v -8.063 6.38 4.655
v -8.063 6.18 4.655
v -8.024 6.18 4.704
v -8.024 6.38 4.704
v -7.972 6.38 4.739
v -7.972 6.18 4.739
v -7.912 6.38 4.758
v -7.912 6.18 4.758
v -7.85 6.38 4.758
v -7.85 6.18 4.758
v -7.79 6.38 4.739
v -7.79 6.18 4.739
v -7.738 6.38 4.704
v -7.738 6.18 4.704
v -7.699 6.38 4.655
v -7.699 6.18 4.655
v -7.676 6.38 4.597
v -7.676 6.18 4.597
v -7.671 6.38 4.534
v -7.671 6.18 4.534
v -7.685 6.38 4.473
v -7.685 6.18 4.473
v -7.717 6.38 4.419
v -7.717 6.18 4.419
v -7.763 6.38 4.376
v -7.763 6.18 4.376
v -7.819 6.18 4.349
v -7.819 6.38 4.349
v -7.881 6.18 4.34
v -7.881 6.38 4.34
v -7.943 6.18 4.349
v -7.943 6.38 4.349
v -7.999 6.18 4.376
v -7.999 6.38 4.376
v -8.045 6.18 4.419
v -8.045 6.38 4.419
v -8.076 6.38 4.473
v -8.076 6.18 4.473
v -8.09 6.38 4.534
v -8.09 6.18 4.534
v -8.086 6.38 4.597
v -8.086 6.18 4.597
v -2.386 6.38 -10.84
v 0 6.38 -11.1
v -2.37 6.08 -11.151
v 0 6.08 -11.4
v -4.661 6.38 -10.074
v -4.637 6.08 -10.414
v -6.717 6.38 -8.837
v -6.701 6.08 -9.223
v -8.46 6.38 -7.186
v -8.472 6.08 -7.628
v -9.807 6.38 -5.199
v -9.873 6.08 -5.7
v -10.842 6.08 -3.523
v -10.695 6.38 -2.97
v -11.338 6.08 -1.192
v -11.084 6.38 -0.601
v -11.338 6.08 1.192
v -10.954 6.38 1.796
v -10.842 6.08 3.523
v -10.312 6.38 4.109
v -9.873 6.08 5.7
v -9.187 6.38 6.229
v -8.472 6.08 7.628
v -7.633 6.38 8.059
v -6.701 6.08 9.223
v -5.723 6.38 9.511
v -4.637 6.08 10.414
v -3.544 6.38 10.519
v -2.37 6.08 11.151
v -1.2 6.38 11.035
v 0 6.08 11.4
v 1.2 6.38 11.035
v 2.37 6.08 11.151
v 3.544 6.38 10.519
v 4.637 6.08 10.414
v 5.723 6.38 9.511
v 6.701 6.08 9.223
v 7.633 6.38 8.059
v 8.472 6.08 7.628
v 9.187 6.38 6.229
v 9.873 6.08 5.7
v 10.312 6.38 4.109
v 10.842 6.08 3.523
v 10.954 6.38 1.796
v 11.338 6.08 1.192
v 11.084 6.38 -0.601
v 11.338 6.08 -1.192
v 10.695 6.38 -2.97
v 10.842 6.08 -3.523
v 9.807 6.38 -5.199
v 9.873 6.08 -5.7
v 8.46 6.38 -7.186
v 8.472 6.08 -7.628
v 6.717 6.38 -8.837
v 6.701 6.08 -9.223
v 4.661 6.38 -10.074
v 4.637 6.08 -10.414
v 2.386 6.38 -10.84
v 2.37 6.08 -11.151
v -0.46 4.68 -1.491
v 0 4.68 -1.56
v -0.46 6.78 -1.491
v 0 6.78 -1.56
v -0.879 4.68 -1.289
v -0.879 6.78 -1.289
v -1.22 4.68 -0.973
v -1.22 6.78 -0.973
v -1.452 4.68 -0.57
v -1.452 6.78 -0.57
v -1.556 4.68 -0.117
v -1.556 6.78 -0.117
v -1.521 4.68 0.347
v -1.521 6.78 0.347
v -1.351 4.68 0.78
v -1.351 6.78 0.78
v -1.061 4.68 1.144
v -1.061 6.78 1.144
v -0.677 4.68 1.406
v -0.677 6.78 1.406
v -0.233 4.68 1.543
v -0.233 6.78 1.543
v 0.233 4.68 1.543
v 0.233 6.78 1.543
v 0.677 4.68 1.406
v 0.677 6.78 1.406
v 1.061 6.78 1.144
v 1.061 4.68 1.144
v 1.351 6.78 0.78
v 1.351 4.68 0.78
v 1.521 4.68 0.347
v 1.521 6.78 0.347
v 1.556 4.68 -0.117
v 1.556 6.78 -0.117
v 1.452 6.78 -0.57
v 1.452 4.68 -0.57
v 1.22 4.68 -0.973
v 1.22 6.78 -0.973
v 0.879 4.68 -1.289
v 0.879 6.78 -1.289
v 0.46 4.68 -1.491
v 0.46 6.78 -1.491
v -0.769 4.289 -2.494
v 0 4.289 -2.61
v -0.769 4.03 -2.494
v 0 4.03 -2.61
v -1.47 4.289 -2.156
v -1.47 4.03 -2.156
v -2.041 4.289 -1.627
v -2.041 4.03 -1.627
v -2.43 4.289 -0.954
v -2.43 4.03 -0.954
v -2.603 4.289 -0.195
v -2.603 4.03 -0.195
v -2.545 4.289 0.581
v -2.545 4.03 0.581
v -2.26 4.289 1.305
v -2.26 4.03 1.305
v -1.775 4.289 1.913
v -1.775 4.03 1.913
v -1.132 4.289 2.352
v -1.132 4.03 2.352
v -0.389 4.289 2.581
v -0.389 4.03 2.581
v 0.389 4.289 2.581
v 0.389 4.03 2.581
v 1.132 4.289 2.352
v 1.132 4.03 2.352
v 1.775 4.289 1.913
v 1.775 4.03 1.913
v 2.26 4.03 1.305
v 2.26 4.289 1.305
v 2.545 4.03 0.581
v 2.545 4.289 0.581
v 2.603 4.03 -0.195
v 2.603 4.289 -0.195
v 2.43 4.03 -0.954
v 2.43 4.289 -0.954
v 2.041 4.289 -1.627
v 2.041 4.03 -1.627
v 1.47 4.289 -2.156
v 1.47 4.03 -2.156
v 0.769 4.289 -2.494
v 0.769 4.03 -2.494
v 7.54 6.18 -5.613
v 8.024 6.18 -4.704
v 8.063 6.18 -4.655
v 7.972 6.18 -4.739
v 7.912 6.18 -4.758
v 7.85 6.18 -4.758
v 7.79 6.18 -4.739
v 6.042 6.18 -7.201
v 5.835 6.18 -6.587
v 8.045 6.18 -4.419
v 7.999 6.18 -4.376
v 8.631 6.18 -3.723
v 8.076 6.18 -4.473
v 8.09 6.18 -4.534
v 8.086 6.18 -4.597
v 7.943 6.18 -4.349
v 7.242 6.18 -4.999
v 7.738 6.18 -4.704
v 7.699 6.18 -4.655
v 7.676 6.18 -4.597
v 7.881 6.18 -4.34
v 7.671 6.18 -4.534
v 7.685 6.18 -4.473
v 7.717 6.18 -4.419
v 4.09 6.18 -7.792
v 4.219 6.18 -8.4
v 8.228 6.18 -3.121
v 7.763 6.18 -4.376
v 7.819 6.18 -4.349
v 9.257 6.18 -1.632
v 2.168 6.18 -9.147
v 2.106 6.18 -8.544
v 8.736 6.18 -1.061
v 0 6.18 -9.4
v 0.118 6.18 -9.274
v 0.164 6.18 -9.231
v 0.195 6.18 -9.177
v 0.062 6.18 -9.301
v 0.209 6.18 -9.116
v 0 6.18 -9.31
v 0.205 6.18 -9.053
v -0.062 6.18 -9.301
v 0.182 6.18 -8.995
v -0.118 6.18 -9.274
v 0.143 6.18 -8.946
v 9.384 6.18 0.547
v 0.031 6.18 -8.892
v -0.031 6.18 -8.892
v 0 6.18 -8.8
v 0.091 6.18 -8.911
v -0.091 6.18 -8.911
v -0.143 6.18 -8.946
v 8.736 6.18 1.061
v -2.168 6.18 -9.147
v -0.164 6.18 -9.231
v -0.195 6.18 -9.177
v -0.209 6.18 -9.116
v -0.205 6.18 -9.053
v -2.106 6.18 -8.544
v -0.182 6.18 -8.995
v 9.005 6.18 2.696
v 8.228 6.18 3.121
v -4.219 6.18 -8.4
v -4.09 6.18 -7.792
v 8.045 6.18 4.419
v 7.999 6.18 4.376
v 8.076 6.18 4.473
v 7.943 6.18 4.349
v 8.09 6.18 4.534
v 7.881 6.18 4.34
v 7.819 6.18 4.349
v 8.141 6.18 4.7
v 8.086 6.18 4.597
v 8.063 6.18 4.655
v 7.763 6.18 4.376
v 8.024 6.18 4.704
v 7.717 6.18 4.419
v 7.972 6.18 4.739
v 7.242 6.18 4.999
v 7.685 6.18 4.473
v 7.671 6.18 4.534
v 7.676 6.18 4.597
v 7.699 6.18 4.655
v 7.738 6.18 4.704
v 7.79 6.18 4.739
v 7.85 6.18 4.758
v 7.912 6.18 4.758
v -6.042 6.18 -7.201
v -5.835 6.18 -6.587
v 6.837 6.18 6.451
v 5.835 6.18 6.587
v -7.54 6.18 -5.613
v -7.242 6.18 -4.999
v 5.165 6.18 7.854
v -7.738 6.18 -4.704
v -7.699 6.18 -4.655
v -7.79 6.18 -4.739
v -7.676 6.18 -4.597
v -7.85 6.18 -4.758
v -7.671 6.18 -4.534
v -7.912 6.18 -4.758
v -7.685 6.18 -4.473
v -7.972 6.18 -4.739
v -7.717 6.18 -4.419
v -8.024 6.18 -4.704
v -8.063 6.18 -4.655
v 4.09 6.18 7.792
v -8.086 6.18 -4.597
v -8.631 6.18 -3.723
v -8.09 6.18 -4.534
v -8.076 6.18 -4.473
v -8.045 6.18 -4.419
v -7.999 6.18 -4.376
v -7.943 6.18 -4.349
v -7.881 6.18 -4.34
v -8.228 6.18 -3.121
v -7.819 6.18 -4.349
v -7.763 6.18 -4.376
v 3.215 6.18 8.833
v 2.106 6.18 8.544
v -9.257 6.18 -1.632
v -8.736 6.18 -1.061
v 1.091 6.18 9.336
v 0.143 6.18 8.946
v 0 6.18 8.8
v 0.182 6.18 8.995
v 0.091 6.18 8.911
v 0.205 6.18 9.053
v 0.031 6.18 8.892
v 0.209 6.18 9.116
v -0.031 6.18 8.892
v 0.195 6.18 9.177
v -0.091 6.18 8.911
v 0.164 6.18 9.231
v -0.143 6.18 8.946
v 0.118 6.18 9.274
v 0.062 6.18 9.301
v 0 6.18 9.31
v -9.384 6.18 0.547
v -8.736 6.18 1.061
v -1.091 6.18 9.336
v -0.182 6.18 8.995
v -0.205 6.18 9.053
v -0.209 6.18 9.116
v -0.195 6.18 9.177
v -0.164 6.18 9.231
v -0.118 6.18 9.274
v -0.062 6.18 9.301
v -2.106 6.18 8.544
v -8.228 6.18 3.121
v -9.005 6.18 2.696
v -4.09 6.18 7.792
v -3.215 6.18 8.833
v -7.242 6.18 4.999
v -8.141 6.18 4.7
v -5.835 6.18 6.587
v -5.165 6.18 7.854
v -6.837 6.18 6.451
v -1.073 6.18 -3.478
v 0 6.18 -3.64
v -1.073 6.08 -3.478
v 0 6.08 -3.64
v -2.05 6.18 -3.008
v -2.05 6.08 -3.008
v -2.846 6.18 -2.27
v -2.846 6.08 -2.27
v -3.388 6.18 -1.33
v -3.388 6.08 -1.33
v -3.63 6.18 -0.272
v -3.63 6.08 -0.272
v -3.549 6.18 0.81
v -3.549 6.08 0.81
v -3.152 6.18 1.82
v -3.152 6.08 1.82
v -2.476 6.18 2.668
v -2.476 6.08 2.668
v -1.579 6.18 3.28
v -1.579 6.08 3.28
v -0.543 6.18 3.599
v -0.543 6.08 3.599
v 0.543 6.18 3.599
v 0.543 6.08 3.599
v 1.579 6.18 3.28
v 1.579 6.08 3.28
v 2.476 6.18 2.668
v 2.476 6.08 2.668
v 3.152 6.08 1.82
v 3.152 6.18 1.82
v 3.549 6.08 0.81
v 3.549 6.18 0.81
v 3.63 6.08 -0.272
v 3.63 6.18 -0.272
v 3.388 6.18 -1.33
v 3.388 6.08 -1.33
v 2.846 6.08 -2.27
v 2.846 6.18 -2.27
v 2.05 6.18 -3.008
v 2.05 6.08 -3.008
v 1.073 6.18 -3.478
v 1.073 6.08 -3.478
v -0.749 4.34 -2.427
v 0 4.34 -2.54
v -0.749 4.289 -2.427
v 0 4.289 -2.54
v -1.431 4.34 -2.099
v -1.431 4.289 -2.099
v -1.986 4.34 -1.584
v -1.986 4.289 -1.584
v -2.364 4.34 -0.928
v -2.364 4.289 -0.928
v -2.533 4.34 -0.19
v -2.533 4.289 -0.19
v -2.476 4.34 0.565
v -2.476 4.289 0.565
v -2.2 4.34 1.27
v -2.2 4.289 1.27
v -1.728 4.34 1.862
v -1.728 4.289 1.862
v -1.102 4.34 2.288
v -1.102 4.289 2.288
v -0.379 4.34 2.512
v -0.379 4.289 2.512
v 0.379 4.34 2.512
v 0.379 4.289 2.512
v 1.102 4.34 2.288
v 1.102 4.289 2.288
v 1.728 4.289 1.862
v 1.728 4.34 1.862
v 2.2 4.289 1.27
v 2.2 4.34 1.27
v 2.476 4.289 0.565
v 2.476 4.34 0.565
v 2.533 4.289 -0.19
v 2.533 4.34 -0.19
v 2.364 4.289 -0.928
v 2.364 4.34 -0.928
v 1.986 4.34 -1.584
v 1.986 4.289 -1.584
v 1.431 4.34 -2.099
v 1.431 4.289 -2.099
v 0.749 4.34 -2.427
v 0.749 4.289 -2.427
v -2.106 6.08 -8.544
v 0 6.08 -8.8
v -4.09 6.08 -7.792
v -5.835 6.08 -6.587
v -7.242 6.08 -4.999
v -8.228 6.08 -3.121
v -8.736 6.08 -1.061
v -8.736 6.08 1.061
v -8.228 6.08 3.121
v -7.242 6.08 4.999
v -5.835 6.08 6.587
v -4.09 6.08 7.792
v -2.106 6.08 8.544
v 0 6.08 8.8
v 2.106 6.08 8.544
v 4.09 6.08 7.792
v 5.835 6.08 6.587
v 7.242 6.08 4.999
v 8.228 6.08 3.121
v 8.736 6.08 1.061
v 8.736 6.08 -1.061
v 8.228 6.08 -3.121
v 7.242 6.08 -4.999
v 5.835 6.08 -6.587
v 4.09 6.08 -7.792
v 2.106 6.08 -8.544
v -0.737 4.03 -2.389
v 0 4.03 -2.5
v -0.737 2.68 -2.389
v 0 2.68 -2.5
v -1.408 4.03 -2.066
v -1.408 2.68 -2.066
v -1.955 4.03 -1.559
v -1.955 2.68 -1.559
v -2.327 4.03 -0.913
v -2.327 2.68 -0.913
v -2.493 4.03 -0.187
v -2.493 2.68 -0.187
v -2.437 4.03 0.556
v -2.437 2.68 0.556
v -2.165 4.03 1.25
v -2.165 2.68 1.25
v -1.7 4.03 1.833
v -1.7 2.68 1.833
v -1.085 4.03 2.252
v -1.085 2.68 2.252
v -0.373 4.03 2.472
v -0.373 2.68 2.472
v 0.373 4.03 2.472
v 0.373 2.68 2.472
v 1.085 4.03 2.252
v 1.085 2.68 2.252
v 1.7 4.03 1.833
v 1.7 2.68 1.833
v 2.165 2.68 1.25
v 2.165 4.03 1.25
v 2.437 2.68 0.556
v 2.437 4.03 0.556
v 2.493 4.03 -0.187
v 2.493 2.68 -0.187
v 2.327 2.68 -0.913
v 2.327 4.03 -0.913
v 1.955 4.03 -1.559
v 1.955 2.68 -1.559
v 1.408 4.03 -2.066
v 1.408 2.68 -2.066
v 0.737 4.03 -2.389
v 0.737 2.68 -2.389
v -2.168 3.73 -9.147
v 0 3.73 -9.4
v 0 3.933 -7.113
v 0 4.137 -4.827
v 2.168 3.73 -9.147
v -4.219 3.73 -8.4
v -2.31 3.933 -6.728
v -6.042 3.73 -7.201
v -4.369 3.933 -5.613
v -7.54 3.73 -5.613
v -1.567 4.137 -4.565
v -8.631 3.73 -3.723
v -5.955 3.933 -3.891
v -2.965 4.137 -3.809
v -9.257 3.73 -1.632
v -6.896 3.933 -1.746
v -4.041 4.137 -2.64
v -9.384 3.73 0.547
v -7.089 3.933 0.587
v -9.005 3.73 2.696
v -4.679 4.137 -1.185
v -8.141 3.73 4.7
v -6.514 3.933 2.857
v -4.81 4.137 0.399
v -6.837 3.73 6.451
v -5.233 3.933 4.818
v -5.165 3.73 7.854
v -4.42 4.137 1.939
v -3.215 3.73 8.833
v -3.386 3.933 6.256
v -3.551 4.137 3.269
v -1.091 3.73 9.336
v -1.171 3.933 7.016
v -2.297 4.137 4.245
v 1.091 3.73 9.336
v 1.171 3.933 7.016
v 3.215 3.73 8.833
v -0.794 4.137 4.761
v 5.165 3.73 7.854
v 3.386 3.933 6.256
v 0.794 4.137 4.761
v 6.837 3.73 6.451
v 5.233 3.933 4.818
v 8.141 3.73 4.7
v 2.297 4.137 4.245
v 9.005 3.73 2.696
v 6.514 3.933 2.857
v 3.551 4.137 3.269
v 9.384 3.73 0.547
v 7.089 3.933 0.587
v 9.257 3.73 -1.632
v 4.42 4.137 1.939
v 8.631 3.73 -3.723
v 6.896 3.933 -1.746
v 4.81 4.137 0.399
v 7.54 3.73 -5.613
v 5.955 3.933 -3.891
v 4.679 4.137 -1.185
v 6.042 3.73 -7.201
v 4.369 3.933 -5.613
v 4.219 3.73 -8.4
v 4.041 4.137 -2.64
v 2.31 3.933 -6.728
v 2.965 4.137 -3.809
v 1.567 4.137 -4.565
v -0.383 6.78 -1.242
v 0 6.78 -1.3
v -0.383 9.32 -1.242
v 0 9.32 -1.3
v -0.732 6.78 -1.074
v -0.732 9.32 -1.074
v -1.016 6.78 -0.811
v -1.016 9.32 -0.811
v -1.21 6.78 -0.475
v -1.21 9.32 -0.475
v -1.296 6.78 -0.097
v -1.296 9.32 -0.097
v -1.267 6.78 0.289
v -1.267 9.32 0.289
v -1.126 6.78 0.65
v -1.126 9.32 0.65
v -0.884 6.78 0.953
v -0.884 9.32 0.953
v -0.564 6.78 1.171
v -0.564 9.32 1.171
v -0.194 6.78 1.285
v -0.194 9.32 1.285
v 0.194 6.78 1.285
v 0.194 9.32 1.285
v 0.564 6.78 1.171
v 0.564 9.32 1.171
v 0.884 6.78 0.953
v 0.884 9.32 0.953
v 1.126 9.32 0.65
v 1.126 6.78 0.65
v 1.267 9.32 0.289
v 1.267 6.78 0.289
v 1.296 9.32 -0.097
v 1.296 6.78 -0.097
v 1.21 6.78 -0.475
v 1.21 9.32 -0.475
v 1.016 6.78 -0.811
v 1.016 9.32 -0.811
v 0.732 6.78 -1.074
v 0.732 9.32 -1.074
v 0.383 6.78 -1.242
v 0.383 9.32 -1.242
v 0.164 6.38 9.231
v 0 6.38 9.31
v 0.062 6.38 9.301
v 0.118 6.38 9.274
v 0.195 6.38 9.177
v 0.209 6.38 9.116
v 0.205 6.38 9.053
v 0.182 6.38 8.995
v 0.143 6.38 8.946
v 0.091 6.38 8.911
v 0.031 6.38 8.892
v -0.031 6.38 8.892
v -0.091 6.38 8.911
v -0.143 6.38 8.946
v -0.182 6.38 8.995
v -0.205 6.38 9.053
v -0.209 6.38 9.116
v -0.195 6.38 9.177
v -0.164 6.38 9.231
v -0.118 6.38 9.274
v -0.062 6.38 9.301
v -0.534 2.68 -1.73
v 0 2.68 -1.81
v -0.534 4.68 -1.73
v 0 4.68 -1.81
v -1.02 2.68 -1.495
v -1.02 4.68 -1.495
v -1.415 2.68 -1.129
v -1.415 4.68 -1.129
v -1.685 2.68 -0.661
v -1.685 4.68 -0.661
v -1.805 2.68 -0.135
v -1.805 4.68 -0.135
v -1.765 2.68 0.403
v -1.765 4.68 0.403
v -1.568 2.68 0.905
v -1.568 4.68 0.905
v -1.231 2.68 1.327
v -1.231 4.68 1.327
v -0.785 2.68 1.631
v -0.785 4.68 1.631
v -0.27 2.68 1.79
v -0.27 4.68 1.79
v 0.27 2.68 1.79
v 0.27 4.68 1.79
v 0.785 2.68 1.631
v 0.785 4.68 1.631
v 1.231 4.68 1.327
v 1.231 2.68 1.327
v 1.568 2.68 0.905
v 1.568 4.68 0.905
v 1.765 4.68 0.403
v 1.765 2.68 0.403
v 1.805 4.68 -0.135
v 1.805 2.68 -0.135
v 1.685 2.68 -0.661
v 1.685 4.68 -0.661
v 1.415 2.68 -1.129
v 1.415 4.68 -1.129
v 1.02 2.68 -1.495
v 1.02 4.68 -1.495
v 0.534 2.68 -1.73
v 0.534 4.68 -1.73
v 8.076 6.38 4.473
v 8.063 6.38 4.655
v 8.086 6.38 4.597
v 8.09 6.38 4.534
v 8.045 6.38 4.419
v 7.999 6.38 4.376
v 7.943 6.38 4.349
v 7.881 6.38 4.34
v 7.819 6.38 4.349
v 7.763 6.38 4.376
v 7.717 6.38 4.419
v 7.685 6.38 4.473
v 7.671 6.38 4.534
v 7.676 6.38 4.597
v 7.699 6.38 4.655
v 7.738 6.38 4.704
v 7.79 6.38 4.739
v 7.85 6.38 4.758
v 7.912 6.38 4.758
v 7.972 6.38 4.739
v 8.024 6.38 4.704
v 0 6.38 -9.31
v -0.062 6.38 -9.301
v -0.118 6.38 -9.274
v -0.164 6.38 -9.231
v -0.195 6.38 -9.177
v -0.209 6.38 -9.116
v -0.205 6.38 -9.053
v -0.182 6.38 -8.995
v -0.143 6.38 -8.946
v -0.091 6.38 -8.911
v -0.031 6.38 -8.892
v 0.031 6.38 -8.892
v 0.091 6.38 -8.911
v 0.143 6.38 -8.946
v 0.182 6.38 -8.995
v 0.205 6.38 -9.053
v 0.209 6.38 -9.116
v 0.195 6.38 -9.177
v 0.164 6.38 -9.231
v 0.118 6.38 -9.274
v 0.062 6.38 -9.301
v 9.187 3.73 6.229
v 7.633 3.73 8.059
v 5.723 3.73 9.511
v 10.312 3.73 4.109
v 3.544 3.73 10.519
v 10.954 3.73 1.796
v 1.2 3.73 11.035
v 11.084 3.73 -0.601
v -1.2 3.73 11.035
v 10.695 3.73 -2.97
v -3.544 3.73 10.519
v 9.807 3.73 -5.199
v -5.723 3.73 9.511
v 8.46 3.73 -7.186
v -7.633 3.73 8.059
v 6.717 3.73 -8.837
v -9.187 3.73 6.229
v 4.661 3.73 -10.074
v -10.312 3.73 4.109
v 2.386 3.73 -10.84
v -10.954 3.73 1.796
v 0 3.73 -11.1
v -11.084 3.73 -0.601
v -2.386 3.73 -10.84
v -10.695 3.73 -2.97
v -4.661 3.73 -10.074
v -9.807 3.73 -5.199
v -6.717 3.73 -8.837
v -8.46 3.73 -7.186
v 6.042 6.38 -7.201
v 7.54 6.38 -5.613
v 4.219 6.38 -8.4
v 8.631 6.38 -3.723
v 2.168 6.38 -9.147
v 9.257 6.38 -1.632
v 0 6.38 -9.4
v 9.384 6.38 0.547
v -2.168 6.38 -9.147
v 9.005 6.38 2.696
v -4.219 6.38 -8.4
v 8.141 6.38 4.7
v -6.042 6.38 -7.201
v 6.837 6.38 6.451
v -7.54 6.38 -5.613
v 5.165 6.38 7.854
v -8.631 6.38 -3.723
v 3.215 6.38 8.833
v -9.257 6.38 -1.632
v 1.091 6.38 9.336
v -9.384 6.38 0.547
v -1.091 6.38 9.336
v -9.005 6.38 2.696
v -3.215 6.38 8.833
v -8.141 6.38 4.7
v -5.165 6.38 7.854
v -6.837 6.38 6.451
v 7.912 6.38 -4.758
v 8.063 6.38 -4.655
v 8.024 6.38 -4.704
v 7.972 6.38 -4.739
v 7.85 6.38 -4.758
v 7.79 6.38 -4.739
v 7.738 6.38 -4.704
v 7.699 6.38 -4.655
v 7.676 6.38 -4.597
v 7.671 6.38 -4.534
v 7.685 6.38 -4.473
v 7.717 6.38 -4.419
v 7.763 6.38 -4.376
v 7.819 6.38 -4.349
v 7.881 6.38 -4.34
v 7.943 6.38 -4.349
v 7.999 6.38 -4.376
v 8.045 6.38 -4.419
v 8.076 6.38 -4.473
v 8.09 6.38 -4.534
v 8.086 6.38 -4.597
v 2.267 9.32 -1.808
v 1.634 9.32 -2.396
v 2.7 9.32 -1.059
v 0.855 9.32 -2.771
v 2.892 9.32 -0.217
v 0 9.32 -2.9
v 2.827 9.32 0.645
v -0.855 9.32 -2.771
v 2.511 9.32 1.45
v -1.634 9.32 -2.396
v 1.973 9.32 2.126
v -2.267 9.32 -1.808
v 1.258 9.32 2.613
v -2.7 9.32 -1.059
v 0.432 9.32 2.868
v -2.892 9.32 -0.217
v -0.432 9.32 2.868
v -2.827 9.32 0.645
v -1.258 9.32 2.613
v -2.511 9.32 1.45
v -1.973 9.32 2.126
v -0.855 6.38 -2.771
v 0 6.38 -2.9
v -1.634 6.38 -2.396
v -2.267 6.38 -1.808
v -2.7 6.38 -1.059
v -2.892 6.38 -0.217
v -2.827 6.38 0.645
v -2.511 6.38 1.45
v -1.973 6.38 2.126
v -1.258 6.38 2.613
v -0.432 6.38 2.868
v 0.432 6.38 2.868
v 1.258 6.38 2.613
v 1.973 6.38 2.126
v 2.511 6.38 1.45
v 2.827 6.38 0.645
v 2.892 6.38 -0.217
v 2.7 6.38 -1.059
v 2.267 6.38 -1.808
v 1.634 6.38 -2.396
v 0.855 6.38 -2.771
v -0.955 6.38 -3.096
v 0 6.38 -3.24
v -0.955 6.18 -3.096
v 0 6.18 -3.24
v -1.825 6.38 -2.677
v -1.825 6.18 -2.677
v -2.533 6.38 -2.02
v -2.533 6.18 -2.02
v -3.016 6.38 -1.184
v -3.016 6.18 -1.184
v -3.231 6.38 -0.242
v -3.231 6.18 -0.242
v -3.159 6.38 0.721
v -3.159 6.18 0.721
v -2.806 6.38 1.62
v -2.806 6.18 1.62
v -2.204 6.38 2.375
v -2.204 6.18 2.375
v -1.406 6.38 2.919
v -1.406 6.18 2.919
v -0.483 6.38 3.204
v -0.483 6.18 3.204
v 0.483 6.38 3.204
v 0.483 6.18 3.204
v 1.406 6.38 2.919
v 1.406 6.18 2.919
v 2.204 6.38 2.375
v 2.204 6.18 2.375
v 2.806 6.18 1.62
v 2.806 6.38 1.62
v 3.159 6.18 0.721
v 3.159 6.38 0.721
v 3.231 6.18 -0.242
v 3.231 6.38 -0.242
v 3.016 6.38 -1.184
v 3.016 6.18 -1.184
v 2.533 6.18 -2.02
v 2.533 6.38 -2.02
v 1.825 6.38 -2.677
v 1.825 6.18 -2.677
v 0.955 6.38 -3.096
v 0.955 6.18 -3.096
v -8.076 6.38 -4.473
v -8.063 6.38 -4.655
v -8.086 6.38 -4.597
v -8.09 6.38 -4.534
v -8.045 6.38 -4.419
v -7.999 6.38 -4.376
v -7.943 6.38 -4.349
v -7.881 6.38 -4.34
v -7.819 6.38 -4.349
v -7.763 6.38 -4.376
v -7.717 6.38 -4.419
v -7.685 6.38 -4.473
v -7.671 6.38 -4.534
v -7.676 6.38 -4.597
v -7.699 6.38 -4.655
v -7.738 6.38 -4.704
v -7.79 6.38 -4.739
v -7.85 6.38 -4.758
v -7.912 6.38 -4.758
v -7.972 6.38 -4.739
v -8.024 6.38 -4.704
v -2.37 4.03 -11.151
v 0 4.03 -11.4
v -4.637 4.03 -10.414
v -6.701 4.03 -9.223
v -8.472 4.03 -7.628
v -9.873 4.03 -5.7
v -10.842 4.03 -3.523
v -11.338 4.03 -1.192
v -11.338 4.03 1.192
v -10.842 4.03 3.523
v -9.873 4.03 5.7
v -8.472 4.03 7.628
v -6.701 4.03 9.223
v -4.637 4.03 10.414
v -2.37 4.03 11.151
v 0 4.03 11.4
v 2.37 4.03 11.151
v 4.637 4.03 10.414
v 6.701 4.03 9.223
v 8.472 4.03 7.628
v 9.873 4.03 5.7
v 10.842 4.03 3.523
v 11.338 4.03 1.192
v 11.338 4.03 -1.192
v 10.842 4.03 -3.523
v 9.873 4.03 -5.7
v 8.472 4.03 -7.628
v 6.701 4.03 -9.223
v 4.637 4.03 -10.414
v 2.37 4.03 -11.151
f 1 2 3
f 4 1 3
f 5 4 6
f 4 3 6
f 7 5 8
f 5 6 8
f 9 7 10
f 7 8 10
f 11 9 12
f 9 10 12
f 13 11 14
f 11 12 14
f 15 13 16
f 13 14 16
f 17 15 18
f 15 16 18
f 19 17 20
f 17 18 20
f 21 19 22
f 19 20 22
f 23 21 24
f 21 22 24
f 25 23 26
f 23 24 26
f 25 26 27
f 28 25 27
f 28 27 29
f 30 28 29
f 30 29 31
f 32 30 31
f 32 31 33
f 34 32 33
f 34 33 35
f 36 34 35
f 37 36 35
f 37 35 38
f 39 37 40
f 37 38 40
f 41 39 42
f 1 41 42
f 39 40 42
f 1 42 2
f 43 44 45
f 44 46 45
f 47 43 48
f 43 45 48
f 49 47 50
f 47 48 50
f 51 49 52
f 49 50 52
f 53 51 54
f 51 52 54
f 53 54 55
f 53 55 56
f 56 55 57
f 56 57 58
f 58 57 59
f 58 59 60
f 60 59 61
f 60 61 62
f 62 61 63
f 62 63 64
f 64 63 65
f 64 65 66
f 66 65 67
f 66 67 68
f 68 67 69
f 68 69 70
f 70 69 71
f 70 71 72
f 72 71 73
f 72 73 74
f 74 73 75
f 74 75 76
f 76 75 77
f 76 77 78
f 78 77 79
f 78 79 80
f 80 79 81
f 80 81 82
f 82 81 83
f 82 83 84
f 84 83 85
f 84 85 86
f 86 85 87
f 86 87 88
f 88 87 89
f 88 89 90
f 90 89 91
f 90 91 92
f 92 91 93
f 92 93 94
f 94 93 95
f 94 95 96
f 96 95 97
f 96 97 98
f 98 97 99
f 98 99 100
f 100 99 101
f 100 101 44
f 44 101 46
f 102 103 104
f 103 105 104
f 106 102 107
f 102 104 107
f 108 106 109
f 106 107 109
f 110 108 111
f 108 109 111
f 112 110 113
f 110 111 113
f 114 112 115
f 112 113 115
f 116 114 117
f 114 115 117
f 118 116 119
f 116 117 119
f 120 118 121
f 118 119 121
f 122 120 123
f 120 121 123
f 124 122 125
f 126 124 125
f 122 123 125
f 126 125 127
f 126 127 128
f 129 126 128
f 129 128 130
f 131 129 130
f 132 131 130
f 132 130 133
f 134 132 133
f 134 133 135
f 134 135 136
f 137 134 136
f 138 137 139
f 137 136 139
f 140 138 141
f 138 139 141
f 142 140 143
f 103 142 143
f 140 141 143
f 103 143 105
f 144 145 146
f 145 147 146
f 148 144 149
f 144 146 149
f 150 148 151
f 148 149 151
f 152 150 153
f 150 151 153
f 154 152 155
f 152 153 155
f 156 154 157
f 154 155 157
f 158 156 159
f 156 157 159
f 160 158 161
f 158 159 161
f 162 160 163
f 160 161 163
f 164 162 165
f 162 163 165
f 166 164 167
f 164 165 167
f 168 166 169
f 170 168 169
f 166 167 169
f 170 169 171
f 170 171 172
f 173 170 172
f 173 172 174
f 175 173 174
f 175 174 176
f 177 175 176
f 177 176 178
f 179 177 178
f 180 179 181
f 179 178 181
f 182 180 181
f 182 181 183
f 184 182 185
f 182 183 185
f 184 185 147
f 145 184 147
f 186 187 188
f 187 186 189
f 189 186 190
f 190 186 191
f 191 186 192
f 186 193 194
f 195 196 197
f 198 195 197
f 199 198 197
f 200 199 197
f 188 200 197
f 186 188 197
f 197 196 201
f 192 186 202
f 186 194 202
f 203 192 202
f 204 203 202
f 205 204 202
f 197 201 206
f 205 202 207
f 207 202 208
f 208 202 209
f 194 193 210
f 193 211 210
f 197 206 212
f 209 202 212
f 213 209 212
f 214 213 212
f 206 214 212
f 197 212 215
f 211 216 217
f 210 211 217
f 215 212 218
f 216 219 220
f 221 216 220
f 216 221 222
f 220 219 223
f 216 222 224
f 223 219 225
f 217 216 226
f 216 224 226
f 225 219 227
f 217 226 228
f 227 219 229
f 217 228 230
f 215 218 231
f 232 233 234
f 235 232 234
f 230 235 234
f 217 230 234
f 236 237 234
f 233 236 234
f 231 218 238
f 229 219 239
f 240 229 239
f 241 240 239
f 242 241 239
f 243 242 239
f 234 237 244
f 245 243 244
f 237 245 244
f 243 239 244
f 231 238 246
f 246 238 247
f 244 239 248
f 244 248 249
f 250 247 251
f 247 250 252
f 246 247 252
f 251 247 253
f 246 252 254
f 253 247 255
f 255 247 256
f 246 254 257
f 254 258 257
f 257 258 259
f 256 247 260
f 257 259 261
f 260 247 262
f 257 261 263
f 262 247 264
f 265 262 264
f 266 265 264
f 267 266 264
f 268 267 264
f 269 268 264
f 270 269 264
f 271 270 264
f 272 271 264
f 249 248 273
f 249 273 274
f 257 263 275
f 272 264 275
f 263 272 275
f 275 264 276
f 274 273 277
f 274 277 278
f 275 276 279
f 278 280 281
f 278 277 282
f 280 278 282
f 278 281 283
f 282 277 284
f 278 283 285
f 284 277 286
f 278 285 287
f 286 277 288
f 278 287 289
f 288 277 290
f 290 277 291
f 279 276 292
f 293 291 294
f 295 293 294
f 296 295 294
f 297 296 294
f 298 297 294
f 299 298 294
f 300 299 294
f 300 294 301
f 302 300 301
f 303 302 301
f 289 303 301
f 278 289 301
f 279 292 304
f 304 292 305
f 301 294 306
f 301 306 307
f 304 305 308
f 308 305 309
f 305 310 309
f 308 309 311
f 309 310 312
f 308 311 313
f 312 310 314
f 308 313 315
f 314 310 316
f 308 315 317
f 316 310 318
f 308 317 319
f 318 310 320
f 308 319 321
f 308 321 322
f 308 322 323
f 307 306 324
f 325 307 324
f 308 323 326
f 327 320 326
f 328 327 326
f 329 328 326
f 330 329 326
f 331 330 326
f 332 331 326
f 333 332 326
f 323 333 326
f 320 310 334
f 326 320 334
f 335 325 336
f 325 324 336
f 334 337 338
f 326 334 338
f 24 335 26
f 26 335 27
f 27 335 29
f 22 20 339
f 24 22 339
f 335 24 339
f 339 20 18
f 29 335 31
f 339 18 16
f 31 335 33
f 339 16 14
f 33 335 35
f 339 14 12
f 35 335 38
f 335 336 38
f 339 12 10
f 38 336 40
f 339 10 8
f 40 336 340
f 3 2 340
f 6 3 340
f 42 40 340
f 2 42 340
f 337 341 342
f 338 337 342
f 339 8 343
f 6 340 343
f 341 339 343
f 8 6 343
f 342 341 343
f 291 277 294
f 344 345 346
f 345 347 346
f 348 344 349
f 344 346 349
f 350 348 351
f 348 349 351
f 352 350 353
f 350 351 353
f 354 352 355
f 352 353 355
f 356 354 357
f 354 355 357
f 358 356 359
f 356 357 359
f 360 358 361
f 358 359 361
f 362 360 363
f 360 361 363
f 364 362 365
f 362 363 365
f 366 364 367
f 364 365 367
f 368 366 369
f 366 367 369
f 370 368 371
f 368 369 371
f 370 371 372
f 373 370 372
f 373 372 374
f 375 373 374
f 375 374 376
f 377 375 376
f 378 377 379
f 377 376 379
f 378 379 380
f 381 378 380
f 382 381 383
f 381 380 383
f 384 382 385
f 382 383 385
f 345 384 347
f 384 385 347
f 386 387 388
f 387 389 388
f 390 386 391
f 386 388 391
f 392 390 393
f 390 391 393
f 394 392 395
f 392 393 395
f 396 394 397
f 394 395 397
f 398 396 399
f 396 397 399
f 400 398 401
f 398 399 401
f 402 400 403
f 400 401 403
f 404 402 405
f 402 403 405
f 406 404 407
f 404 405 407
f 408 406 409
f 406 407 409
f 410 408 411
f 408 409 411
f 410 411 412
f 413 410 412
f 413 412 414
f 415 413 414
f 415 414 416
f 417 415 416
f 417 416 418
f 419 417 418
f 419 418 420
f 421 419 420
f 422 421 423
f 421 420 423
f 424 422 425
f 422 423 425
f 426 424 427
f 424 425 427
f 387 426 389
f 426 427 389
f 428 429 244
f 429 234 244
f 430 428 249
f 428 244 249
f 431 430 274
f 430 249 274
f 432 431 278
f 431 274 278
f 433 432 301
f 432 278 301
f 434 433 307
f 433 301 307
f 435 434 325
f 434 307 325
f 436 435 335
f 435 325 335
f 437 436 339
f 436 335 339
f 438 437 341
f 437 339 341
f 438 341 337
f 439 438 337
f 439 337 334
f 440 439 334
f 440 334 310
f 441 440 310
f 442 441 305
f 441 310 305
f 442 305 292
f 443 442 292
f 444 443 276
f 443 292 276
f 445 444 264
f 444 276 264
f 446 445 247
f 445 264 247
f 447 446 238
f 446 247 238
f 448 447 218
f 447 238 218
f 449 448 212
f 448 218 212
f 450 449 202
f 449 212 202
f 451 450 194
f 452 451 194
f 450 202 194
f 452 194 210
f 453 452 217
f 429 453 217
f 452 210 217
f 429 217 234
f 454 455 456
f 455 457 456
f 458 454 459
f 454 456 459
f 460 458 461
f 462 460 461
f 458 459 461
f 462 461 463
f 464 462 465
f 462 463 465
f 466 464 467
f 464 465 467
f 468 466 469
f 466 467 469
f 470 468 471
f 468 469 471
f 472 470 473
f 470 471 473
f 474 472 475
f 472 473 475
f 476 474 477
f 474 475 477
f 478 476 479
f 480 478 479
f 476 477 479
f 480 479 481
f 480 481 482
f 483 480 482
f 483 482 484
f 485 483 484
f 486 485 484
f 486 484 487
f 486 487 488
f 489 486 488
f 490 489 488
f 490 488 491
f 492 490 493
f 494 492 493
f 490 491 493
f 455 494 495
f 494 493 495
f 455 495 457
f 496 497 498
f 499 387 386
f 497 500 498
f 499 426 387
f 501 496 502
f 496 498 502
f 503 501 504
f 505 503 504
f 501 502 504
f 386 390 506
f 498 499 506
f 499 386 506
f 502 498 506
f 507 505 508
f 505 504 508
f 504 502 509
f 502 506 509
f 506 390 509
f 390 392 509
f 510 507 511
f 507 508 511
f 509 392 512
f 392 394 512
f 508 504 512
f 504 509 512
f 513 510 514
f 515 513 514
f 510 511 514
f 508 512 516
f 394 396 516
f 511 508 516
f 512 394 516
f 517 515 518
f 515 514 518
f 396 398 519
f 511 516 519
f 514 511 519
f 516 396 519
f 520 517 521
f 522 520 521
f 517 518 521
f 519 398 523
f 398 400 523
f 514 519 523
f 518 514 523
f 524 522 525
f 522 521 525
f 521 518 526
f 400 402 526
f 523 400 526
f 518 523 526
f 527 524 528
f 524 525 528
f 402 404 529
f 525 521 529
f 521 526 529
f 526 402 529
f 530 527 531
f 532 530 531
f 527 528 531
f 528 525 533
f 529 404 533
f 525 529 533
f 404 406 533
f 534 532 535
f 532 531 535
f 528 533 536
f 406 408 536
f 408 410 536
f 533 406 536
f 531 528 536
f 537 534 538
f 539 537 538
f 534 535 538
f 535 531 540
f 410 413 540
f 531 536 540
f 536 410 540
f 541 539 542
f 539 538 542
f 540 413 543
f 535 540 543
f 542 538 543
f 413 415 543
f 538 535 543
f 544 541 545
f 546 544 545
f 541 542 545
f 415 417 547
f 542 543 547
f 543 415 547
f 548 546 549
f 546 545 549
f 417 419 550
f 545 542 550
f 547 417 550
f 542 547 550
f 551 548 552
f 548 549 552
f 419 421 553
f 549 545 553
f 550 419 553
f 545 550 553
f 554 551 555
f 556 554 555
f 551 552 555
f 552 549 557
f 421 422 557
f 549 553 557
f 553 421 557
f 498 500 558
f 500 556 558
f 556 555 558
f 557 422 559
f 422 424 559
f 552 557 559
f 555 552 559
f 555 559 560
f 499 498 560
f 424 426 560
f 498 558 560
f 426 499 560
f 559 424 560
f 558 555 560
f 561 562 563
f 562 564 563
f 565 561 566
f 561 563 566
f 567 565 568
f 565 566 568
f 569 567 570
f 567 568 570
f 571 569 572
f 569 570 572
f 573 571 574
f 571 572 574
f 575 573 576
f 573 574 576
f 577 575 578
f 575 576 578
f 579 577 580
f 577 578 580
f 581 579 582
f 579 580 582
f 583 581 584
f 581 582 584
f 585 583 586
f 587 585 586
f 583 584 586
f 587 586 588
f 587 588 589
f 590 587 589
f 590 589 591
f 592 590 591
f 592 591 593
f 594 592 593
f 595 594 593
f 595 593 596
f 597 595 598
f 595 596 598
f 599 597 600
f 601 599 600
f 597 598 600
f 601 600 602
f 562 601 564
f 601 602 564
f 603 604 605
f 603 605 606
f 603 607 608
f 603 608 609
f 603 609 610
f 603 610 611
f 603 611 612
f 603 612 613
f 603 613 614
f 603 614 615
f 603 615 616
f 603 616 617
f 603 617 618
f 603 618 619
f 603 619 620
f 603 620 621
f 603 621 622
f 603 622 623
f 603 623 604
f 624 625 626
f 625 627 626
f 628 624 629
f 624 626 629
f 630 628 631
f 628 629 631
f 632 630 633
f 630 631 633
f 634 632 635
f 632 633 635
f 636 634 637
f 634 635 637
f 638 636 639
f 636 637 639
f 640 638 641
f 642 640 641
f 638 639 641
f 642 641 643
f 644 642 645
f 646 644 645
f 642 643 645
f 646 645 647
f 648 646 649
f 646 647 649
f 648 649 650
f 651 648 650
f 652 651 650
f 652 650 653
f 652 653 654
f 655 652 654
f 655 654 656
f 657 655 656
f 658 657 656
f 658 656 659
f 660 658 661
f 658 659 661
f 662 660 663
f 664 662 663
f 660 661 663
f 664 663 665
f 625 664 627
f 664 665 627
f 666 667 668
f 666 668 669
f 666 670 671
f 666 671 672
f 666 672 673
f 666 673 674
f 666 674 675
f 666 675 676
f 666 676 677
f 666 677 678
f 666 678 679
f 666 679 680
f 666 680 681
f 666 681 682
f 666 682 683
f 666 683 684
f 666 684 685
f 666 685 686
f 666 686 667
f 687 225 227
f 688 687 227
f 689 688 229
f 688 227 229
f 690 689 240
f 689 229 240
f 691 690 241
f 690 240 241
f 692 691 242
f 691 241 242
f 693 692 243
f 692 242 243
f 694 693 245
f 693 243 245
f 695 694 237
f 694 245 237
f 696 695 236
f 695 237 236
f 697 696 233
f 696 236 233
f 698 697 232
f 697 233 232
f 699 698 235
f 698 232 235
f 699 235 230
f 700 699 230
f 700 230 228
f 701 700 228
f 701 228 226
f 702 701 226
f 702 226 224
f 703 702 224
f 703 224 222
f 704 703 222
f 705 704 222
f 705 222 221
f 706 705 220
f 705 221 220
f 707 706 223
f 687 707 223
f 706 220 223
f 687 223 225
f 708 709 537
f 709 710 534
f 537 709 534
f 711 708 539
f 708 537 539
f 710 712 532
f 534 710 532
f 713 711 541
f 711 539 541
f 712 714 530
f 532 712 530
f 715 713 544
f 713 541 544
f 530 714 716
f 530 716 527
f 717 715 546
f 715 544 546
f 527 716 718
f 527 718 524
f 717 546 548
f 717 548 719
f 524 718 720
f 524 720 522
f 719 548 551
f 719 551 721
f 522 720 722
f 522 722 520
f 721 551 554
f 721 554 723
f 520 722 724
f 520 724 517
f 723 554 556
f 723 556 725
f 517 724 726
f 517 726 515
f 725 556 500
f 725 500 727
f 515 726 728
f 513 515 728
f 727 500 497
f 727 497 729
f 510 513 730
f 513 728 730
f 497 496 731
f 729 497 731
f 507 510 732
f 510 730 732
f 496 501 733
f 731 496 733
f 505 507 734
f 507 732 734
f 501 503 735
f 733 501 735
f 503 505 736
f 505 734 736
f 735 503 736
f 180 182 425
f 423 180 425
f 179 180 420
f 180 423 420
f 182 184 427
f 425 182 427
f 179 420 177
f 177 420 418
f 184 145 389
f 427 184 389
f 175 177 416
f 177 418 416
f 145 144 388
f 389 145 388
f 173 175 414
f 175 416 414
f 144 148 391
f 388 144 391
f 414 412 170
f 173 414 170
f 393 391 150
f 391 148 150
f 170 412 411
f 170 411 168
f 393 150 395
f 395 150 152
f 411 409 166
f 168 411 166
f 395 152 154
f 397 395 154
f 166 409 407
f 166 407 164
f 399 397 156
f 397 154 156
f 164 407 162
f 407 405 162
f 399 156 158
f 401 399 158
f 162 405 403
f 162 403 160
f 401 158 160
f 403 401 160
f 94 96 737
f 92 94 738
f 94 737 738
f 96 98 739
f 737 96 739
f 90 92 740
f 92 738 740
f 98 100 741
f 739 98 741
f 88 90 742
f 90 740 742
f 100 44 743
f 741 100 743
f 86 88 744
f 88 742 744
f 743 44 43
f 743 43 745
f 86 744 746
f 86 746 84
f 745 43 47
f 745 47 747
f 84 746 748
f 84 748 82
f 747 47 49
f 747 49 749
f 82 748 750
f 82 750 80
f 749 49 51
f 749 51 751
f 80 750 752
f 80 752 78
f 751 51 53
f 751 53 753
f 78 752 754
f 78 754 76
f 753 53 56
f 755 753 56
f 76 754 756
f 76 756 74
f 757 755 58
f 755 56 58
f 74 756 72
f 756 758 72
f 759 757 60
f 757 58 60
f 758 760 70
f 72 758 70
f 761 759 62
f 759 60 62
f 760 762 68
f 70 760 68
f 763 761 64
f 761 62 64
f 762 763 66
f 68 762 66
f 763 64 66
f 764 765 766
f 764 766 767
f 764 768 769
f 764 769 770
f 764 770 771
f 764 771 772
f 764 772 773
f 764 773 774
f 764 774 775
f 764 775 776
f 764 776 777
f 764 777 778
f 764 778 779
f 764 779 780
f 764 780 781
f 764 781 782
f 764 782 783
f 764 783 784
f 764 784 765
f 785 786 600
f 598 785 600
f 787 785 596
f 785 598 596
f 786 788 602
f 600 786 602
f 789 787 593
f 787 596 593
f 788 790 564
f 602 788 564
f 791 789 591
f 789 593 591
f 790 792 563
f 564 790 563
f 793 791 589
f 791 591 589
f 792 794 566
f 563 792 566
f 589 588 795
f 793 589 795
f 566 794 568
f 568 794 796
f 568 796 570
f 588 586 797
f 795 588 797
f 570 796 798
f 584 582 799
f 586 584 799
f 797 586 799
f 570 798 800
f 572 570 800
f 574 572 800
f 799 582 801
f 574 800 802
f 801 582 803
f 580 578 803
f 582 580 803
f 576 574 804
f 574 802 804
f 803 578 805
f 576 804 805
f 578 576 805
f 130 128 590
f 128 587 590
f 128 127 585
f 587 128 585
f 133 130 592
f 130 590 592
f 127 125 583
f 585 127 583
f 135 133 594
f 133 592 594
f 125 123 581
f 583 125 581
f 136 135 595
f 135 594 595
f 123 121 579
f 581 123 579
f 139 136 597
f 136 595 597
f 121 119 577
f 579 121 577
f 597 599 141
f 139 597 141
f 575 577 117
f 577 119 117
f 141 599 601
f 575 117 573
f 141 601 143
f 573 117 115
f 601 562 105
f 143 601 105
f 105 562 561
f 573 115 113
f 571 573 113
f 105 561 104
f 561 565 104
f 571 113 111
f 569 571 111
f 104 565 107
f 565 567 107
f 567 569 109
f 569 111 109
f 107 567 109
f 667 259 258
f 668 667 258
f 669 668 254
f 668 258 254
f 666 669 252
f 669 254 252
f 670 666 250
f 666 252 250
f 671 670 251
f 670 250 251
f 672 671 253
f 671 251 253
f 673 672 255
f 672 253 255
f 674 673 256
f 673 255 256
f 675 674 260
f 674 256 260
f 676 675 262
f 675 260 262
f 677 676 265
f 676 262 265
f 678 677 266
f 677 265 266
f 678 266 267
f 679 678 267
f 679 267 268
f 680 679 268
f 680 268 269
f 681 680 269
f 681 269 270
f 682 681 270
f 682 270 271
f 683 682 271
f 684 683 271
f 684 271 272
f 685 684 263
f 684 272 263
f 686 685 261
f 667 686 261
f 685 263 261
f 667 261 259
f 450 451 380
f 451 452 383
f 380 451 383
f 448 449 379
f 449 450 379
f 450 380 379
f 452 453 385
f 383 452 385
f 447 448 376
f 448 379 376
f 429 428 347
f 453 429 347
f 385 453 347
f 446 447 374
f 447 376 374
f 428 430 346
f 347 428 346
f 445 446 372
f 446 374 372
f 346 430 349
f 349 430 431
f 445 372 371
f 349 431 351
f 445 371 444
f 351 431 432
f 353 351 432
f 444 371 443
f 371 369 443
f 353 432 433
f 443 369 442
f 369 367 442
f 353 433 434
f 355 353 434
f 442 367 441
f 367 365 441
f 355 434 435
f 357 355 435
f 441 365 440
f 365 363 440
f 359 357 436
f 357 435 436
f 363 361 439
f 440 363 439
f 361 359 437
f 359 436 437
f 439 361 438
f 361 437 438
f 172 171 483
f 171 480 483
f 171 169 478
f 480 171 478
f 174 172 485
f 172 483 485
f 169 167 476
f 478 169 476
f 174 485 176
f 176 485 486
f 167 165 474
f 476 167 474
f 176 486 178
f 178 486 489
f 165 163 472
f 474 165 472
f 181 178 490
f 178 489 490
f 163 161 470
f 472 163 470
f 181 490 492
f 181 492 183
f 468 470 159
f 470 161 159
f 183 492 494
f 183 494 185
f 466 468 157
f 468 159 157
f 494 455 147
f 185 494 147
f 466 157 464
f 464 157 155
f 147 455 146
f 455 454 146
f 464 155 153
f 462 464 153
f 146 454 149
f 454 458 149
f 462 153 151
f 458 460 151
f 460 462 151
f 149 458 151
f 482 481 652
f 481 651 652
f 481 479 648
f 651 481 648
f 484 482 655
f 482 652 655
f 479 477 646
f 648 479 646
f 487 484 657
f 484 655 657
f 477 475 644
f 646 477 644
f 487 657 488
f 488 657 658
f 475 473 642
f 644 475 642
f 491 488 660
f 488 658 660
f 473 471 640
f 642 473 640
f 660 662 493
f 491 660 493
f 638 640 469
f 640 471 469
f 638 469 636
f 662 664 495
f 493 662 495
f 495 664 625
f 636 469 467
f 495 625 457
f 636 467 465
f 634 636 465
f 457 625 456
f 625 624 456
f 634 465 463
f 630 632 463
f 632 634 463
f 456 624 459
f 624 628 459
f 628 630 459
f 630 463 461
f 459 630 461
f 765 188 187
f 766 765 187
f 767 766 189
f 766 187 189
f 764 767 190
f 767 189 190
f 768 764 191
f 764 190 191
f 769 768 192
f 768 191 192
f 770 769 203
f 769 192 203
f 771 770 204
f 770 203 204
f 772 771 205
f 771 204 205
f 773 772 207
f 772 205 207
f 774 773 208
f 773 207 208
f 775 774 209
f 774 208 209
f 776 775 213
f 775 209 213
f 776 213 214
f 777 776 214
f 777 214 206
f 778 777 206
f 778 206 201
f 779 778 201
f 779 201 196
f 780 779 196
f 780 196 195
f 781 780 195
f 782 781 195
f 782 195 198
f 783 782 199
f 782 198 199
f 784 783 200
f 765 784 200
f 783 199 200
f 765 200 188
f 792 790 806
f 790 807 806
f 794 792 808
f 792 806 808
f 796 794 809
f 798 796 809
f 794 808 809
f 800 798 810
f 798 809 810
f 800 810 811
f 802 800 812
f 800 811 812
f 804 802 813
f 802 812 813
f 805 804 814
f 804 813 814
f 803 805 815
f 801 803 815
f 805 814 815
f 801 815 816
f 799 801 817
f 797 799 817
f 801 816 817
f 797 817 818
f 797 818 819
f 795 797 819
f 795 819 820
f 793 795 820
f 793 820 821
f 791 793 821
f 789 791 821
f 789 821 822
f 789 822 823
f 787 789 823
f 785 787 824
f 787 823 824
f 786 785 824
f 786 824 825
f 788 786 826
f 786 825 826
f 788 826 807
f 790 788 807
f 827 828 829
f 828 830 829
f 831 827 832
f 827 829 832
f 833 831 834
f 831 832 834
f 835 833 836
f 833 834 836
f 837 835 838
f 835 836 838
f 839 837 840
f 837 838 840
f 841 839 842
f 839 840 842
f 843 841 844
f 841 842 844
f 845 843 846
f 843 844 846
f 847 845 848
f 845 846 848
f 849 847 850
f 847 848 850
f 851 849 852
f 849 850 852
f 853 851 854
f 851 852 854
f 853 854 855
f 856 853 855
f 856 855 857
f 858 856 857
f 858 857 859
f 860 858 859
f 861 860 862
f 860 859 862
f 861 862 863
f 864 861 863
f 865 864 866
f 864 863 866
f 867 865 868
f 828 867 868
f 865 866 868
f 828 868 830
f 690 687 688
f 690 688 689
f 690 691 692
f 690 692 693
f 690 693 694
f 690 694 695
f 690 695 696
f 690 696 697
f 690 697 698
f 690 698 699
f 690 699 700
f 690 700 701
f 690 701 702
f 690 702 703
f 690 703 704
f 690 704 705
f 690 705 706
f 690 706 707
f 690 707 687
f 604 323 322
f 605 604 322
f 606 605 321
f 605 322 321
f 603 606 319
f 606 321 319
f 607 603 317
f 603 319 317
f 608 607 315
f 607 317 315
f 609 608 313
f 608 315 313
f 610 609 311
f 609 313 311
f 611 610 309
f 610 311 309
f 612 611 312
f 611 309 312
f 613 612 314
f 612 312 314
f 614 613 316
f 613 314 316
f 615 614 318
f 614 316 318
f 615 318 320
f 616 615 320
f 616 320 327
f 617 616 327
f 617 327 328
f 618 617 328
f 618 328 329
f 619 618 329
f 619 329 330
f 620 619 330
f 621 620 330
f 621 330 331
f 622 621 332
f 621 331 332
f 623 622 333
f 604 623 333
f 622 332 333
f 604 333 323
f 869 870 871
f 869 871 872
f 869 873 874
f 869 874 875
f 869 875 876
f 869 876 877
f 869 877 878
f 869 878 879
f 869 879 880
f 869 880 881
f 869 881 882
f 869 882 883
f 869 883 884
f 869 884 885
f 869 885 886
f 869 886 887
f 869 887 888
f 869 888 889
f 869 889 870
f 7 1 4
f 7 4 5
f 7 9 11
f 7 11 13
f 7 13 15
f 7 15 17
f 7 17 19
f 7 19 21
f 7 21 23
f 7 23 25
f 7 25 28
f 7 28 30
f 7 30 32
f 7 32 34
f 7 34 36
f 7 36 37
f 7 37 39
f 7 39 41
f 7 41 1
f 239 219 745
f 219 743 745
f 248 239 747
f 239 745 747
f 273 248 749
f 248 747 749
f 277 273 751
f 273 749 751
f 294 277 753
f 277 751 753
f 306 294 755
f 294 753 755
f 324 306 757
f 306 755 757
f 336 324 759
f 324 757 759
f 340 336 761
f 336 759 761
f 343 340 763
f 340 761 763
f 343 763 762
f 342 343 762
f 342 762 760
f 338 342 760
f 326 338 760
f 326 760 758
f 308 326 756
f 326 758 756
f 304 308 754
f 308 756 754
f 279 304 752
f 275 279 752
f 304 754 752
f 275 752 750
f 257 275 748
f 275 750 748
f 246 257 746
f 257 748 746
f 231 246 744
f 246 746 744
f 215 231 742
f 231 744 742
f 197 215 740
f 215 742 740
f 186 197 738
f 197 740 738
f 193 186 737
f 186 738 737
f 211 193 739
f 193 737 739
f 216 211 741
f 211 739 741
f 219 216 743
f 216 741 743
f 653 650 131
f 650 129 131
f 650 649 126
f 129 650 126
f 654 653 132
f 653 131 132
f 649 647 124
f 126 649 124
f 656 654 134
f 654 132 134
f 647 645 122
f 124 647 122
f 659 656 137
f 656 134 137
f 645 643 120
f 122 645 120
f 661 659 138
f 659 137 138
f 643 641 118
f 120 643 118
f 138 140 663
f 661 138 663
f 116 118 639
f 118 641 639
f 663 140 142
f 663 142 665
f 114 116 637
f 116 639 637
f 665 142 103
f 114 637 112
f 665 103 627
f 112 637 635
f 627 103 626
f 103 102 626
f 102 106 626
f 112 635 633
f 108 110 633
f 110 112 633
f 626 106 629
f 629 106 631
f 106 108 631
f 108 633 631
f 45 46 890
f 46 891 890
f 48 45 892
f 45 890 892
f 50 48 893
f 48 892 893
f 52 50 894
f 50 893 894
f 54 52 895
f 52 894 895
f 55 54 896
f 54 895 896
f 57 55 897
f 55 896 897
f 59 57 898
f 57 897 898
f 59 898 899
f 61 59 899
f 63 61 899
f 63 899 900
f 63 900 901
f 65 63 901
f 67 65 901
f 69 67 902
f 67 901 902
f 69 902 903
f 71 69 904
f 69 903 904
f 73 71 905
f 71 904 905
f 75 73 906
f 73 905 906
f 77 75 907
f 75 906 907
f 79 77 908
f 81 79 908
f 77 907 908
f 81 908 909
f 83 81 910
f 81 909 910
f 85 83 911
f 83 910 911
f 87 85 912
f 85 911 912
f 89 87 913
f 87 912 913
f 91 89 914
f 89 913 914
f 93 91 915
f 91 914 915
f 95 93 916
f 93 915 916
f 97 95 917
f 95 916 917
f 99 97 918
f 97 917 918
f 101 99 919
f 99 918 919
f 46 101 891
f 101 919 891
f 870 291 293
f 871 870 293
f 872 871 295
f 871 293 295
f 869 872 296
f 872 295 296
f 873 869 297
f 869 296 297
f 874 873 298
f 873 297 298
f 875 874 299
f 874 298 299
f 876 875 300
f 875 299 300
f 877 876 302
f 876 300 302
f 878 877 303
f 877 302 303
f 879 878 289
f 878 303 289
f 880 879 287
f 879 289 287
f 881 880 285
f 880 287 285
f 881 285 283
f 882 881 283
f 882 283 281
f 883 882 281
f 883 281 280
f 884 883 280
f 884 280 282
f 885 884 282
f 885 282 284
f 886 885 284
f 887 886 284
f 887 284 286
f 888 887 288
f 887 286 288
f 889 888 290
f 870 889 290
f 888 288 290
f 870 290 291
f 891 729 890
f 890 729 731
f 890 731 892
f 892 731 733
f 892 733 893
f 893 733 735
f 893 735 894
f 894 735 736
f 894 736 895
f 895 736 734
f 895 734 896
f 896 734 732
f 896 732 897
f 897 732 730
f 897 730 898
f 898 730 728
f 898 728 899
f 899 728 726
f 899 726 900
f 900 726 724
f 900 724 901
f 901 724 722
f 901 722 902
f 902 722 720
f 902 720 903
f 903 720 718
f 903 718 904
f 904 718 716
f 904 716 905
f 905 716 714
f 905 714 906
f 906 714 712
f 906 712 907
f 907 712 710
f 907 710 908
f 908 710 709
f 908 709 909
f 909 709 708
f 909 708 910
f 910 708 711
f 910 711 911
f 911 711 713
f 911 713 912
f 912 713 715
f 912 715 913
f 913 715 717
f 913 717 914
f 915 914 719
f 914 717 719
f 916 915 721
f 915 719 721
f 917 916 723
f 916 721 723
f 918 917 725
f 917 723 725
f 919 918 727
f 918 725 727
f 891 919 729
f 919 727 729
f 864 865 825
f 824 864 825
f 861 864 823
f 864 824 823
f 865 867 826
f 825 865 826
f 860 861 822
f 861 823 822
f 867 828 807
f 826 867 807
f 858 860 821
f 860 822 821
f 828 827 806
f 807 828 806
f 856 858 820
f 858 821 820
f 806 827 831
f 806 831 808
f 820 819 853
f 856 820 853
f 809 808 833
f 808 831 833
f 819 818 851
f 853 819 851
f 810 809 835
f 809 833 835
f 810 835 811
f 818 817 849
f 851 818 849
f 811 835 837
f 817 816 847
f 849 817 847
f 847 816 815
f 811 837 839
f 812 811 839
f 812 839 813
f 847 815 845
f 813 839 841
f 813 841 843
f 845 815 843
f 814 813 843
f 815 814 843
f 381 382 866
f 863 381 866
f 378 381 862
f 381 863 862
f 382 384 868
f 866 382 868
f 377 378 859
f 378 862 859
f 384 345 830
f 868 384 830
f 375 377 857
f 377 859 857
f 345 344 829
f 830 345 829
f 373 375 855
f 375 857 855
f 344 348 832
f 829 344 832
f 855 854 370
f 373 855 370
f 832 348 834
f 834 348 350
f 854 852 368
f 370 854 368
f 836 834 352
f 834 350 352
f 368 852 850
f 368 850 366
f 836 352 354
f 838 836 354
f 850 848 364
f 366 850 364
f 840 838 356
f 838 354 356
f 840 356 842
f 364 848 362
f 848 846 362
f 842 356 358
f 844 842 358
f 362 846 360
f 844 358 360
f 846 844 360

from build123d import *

# Parameters (mm, degrees)
SKETCH3_R           = 0.21
BOSS_EXTRUDE1_DEPTH = 0.2
CIRPATTERN1_COUNT   = 6


with BuildPart() as part:
    # Sketch2 → Revolve1 (revolve)
    with BuildSketch(Plane.XY, mode=Mode.PRIVATE) as revolve1_sk:
        Polygon((-1.81, 2.68), (-1.81, 4.68), (-1.56, 4.68), (-1.56, 6.78), (-1.3, 6.78), (-1.3, 9.32), (-2.9, 9.32), (-2.9, 6.38), (-3.24, 6.38), (-3.24, 6.18), (-3.64, 6.18), (-3.64, 6.08), (-8.8, 6.08), (-8.8, 6.18), (-9.4, 6.18), (-9.4, 6.38), (-11.1, 6.38), (-11.4, 6.08), (-11.4, 4.03), (-11.1, 3.73), (-9.4, 3.73), (-2.54, 4.34), (-2.54, 4.289146726), (-2.61, 4.289146726), (-2.61, 4.03), (-2.5, 4.03), (-2.5, 2.68), align=None)
    revolve(revolve1_sk.sketch.rotate(Axis((0, 0, 0), (0, 1, 0)), 270), axis=Axis((0, 0, 0), (0, 1, 0)))

    # Sketch3 → Boss-Extrude1 (add)
    with BuildSketch(Plane(origin=(0, 6.18, 0), x_dir=(1, 0, 0), z_dir=(0, 1, 0))):
        with Locations(Location((0, 9.1, 0), (0, 0, 90))):
            Circle(SKETCH3_R)
    boss_extrude1 = extrude(amount=BOSS_EXTRUDE1_DEPTH)

    # CirPattern1: Boss-Extrude1 ×6 about axis
    cirpattern1_axis = Axis((0, 0, 0), (0, 1, 0))
    for i in range(1, CIRPATTERN1_COUNT):
        add(boss_extrude1.rotate(cirpattern1_axis, i * 360 / CIRPATTERN1_COUNT))


solid = part.part
